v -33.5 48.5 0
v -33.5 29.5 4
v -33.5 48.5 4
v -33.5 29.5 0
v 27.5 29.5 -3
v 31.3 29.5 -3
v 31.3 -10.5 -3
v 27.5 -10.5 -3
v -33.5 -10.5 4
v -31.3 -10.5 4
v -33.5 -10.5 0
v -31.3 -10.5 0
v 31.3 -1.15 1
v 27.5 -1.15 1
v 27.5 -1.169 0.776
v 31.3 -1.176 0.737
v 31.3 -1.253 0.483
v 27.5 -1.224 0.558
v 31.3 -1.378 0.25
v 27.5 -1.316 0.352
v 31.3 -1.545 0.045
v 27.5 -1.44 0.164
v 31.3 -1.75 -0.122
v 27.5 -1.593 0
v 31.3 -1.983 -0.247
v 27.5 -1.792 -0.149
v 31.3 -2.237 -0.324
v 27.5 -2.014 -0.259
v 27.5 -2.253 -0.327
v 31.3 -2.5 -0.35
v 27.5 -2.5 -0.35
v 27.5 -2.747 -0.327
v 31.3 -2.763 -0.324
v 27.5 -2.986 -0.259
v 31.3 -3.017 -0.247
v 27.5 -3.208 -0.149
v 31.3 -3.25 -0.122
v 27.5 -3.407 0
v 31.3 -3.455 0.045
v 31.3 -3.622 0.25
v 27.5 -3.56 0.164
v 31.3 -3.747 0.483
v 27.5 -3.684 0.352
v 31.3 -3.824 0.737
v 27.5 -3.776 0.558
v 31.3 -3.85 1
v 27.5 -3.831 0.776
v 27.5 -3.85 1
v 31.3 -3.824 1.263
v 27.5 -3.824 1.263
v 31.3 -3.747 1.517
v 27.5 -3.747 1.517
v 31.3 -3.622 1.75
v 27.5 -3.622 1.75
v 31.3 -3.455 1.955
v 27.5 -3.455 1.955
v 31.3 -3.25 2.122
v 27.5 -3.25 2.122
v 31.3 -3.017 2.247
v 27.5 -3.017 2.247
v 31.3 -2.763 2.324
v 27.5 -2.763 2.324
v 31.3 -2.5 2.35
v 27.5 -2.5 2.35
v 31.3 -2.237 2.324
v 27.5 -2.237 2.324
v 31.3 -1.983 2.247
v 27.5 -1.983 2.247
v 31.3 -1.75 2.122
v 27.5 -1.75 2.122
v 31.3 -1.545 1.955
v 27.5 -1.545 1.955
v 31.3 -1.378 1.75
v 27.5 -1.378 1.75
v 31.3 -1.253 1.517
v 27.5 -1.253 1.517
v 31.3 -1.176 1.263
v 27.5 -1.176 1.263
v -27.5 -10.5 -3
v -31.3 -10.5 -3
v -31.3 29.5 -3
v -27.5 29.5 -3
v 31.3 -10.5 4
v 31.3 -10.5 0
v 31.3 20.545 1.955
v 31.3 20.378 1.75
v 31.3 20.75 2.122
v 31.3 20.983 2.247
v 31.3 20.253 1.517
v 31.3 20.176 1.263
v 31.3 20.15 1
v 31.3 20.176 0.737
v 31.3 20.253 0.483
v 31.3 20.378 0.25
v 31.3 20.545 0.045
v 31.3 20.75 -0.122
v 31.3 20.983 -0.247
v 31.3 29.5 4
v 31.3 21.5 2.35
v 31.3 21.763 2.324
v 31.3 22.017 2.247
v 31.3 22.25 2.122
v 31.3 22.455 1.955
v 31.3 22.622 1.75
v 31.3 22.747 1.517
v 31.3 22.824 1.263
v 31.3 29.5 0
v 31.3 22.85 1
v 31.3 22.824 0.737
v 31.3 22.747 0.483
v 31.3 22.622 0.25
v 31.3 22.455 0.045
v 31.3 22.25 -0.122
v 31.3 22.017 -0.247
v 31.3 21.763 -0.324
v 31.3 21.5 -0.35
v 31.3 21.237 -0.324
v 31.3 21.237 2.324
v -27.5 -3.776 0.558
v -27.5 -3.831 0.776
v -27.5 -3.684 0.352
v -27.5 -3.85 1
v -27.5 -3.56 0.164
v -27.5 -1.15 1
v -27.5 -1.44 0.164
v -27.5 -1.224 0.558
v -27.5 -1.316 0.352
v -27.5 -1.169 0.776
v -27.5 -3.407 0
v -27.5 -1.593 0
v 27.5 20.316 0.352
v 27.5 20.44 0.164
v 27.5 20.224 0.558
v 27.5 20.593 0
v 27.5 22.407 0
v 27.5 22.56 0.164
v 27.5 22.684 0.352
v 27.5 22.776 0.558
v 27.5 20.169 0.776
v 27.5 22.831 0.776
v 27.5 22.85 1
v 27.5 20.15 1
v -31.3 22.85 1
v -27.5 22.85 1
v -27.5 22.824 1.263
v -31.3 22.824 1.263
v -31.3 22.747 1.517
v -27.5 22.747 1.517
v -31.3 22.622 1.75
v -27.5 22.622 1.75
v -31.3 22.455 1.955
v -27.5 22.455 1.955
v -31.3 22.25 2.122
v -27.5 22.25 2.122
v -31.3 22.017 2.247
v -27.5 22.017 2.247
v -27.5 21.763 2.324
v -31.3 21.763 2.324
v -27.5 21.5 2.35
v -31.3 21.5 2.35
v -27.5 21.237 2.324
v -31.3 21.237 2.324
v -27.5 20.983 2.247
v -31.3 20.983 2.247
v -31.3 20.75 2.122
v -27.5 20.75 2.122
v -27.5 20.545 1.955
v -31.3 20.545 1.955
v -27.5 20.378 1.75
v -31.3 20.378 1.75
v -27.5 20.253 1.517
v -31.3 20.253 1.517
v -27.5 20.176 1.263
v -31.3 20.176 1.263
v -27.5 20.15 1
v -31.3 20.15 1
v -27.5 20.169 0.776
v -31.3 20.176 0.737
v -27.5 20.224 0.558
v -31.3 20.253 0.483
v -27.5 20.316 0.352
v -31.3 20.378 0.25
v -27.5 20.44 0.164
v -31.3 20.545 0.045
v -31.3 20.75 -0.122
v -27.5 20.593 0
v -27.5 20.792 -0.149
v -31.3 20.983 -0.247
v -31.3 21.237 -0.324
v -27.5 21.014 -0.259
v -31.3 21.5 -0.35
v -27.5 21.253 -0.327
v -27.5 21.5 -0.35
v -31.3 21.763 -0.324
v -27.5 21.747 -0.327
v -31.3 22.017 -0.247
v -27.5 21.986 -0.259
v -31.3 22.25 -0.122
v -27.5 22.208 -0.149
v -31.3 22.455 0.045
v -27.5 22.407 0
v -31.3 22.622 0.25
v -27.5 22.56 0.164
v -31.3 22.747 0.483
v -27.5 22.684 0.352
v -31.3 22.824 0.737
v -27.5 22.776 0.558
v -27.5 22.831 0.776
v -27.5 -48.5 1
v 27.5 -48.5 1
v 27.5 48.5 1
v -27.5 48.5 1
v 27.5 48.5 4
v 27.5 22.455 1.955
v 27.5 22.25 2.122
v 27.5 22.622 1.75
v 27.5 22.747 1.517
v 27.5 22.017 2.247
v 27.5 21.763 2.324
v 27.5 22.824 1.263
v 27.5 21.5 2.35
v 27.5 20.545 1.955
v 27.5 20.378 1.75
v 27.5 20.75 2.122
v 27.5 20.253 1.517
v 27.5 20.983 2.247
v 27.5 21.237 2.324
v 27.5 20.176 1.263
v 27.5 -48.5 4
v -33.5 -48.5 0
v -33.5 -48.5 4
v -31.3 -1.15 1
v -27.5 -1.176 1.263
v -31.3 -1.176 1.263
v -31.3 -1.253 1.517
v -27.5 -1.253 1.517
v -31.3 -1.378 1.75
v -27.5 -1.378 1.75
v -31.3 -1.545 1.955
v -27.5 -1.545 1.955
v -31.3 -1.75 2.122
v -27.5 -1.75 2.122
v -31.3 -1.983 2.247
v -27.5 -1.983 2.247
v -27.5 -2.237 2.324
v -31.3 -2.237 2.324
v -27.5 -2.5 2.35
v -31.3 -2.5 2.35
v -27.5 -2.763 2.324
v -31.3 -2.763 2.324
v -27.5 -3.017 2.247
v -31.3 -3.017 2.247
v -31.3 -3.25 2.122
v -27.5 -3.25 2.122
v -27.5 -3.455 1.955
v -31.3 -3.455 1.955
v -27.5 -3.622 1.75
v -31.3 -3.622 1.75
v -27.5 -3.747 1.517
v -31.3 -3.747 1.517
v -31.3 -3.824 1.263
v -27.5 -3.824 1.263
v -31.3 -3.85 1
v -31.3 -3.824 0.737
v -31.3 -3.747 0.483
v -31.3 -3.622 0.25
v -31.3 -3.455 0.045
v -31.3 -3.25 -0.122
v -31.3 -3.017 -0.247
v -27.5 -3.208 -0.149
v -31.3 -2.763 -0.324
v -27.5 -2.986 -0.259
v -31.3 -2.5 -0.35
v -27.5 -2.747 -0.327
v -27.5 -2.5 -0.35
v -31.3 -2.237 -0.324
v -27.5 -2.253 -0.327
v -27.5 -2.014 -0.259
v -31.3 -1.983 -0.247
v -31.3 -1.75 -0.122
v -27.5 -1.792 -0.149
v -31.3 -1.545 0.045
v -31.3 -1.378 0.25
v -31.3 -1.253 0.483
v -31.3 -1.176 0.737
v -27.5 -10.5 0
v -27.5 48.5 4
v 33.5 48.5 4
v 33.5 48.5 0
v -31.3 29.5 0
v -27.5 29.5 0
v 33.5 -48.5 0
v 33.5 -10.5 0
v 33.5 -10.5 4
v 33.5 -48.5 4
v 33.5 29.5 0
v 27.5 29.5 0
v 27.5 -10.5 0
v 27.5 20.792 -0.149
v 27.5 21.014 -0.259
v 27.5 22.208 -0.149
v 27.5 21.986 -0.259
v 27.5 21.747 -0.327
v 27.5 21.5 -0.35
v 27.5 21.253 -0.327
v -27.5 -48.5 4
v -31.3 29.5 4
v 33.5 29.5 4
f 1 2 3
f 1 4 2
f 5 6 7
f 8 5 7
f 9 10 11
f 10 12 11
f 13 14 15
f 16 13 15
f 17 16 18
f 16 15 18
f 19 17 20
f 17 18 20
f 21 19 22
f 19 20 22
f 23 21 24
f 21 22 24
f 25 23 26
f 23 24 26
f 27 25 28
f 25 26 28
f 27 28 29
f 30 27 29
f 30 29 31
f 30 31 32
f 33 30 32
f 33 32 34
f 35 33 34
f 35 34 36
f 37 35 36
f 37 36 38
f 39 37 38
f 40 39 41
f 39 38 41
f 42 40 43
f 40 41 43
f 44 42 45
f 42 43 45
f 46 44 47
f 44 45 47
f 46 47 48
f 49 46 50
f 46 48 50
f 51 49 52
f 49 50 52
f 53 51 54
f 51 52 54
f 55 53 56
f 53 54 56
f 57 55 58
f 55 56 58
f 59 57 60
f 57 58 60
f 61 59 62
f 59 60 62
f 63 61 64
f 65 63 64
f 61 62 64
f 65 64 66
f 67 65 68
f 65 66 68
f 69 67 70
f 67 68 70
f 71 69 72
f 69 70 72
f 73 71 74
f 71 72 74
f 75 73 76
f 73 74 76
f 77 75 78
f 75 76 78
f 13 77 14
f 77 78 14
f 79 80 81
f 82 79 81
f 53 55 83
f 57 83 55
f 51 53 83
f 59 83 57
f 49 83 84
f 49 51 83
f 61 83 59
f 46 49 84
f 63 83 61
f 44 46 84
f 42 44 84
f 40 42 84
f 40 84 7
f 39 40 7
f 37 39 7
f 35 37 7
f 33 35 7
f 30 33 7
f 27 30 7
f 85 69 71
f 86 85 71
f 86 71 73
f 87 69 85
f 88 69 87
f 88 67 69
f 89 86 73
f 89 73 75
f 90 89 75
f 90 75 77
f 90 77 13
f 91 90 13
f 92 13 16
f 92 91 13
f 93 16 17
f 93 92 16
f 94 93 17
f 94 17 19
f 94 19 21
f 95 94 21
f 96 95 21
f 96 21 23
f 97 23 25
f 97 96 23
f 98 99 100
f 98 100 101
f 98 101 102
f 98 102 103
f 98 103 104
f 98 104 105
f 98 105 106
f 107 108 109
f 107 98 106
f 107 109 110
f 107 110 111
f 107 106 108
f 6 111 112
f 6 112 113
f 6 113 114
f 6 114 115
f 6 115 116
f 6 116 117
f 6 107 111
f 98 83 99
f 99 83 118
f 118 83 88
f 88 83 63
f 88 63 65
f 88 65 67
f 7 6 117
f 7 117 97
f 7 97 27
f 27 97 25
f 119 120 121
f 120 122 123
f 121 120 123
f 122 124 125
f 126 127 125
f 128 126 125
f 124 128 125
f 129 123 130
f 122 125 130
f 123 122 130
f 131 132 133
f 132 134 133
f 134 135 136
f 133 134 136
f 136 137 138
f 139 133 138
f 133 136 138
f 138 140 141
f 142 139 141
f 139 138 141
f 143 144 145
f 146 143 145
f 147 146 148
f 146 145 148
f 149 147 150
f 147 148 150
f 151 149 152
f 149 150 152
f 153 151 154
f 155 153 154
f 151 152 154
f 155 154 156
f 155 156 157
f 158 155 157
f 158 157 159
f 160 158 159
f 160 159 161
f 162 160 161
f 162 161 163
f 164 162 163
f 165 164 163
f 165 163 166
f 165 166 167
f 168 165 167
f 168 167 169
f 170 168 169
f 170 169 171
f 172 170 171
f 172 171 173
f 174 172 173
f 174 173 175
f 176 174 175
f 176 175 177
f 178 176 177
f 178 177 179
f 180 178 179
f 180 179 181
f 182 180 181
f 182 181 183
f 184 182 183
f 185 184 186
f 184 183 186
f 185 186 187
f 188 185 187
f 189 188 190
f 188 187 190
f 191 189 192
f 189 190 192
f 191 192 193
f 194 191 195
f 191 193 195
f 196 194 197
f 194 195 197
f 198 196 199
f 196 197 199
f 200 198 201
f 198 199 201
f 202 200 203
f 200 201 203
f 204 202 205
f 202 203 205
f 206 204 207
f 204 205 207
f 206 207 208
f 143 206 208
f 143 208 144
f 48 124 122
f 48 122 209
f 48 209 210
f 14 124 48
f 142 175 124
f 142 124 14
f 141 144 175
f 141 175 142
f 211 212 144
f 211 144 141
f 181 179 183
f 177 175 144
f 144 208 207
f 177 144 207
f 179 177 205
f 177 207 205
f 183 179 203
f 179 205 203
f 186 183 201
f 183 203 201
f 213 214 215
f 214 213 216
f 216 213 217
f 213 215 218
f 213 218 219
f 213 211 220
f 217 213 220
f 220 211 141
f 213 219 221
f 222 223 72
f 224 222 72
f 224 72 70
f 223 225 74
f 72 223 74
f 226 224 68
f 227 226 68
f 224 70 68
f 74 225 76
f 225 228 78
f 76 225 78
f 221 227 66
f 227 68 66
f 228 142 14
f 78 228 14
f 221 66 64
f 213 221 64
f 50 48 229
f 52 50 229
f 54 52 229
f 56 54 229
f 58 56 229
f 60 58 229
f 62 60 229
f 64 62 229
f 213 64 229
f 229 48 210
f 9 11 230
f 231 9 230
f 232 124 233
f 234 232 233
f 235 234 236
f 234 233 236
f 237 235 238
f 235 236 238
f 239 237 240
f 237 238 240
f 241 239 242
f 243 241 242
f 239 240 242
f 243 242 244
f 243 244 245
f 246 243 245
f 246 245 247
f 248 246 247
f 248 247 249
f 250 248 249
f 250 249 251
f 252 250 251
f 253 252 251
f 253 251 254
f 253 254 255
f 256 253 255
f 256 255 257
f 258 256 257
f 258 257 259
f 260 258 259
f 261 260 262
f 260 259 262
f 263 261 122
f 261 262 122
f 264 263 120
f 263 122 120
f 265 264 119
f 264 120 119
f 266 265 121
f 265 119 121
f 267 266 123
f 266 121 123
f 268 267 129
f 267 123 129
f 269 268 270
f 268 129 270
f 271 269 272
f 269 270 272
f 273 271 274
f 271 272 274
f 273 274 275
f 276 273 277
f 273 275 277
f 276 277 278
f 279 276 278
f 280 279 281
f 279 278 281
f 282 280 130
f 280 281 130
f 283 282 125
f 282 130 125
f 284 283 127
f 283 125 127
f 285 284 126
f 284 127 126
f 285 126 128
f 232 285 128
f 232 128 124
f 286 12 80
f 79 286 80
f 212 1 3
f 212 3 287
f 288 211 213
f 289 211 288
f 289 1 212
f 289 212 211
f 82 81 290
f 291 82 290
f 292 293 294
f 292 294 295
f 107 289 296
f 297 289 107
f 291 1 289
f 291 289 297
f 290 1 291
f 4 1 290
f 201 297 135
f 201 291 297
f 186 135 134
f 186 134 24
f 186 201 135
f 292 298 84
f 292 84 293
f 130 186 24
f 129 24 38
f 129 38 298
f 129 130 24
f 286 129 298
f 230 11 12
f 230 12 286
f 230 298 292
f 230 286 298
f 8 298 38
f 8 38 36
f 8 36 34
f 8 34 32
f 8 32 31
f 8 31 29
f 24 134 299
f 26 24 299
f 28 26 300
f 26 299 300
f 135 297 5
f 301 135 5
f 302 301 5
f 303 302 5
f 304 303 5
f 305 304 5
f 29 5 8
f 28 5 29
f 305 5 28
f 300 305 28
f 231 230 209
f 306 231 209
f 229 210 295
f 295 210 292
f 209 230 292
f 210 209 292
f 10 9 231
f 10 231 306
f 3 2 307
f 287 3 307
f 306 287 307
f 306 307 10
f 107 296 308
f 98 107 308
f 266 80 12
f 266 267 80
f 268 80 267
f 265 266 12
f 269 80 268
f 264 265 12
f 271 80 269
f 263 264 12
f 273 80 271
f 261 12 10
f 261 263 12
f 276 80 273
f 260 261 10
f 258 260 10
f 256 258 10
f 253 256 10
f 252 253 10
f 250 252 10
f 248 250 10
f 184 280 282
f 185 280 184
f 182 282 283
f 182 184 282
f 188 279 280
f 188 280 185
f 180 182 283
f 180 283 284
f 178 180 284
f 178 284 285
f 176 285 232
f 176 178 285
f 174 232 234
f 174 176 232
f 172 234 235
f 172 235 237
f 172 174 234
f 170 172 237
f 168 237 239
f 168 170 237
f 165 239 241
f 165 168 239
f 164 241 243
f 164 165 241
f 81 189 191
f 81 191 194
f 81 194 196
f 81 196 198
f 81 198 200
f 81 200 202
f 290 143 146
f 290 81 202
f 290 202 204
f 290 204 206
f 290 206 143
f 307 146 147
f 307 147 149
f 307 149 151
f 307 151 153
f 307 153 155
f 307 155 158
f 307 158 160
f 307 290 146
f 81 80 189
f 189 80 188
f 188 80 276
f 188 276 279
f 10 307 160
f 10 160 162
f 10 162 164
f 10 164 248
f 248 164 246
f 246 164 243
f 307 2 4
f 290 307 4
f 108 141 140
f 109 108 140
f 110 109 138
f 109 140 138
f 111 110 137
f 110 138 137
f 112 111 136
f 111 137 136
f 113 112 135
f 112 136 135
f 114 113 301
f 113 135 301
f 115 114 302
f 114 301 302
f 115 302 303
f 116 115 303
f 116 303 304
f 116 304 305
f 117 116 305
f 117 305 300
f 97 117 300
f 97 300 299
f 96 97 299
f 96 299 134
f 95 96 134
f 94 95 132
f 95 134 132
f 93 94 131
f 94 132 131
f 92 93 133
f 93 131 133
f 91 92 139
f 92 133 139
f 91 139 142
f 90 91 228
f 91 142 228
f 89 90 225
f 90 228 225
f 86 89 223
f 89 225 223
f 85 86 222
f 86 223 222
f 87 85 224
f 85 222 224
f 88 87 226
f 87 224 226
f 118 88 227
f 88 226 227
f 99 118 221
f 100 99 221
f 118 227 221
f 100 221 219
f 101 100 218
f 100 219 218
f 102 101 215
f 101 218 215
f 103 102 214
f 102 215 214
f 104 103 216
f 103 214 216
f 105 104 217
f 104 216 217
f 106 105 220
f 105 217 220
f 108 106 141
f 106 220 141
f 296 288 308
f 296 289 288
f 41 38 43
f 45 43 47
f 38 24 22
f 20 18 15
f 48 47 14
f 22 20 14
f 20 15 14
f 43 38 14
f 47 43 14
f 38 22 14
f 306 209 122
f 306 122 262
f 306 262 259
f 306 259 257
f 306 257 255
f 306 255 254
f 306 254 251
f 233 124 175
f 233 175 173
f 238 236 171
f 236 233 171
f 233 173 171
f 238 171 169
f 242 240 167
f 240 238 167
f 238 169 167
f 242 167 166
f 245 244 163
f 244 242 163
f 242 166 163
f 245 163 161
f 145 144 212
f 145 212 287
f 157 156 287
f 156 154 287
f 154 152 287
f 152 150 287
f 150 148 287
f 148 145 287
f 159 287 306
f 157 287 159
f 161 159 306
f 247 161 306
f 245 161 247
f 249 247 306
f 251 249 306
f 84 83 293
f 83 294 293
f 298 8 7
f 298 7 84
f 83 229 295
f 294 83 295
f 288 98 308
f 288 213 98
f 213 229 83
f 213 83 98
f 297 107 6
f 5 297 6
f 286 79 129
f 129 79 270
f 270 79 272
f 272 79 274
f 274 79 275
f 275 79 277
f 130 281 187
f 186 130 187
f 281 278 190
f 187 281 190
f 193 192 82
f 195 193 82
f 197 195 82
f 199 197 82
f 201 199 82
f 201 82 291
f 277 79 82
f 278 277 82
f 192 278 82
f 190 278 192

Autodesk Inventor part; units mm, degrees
ref_plane "YZ Plane" through (0, 0, 0) normal (1, 0, 0) x (0, 1, 0)
ref_plane "XZ Plane" through (0, 0, 0) normal (0, 1, 0) x (-1, 0, 0)
ref_plane "XY Plane" through (0, 0, 0) normal (0, 0, 1) x (1, 0, 0)
sketch "スケッチ1" plane through (0, 0, 0) normal (0, 0, 1) x (1, 0, 0)
  line L0 (33.5, -48.5) -> (-33.5, -48.5)
  line L1 (-33.5, -48.5) -> (-33.5, 48.5)
  line L2 (-33.5, 48.5) -> (33.5, 48.5)
  line L3 (33.5, 48.5) -> (33.5, -48.5)
  line L4 (33.5, -48.5) -> (-33.5, 48.5) construction
  line L5 (-33.5, -48.5) -> (33.5, 48.5) construction
  point P0 (0, 0)
  dimension "d0" = 67
  dimension "d1" = 97
extrude "押し出し1" add sketch "スケッチ1" along normal blind 1
sketch "スケッチ3" plane through (33.5, -48.5, 0) normal (1, 0, 0) x (0, 0, -1)
  line L0 (0, 78) -> (-5, 78)
  line L1 (-5, 78) -> (-5, 38)
  line L2 (-5, 38) -> (0, 38)
  line L3 (0, 38) -> (0, 78)
  circle A0 centre (-1, 70) radius 1.35
  line L4 (0, 97) -> (-1, 97) projected
  line L5 (0, 0) -> (0, 97) projected
  circle A1 centre (-1, 46) radius 1.35
  point P0 (0, 48.5)
  dimension "d4" = 5
  dimension "d5" = 27
  dimension "d6" = 8
  dimension "d7" = 40
  dimension "d8" = 2.7
  dimension "d9" = 8
  dimension "d48" = 1
extrude "押し出し2" add sketch "スケッチ3" against normal blind 6 contours L3 A0 A1 L2 L1 L0
extrude "押し出し3" cut sketch "スケッチ3" against normal blind 2.2 contours L3 A0 A1 L2 L1 L0
mirror "ミラー1" about plane through (0, 0, 0) normal (1, 0, 0) of "押し出し2", "押し出し3"
sketch "スケッチ12" plane through (31.3, -48.5, 0) normal (1, 0, 0) x (0, 0, -1)
  line L0 (-1, 78) -> (-5, 78) projected
  line L1 (-5, 78) -> (3, 78)
  line L2 (3, 78) -> (3, 38)
  line L3 (3, 38) -> (-5, 38)
  line L4 (-5, 38) -> (-5, 78)
  arc A0 (-1, 71.35) -> (-1, 68.65) centre (-1, 70) ccw projected
  arc A1 (-1, 47.35) -> (-1, 44.65) centre (-1, 46) ccw projected
  circle A2 centre (-1, 70) radius 1.35
  circle A3 centre (-1, 46) radius 1.35
  point P0 (0, 48.5)
  point P1 (0, 38)
  point P2 (-1, 68.65)
  point P3 (-1, 44.65)
  dimension "d49" = 8
extrude "押し出し15" add sketch "スケッチ12" against normal up to surface (3.8 mm away)
sketch "スケッチ13" plane through (27.5, -10.5, -3) normal (-1, 0, 0) x (0, 0, 1)
  line L0 (4, 30.65) -> (4, 33.35) projected
  circle A0 centre (4, 32) radius 1.35
  line L1 (4, 6.65) -> (4, 9.35) projected
  circle A1 centre (4, 8) radius 1.35
  arc A2 (4, 30.65) -> (4, 33.35) centre (4, 32) ccw projected
  arc A3 (4, 6.65) -> (4, 9.35) centre (4, 8) ccw projected
  point P0 (3, 10.5)
extrude "押し出し16" cut sketch "スケッチ13" against normal through all
mirror "ミラー2" about plane through (0, 0, 0) normal (1, 0, 0) of "押し出し15", "押し出し16"
sketch "スケッチ14" plane through (0, 0, 1) normal (0, 0, 1) x (1, 0, 0)
  line L0 (-27.5, -10.5) -> (-27.5, 29.5) projected
  line L1 (27.5, -10.5) -> (27.5, 29.5) projected
  line L2 (33.5, 48.5) -> (-33.5, 48.5) projected
  line L3 (-33.5, -48.5) -> (33.5, -48.5) projected
  line L4 (-27.5, 48.5) -> (27.5, 48.5)
  line L5 (27.5, 48.5) -> (27.5, -48.5)
  line L6 (27.5, -48.5) -> (-27.5, -48.5)
  line L7 (-27.5, -48.5) -> (-27.5, 48.5)
  line L8 (-27.5, 22.85) -> (-27.5, 20.15) projected
  line L9 (-27.5, 20.15) -> (-27.5, -1.15) projected
  line L10 (-27.5, -1.15) -> (-27.5, -3.85) projected
  line L11 (-27.5, -3.85) -> (-27.5, -10.5) projected
  line L12 (-27.5, -10.5) -> (-31.3, -10.5) projected
  line L13 (-31.3, -10.5) -> (-33.5, -10.5) projected
  line L14 (-33.5, -10.5) -> (-33.5, -48.5) projected
  line L15 (-33.5, -48.5) -> (33.5, -48.5) projected
  line L16 (33.5, -48.5) -> (33.5, -10.5) projected
  line L17 (33.5, -10.5) -> (31.3, -10.5) projected
  line L18 (31.3, -10.5) -> (27.5, -10.5) projected
  line L19 (27.5, -10.5) -> (27.5, -3.85) projected
  line L20 (27.5, -3.85) -> (27.5, -1.15) projected
  line L21 (27.5, -1.15) -> (27.5, 20.15) projected
  line L22 (27.5, 20.15) -> (27.5, 22.85) projected
  line L23 (27.5, 22.85) -> (27.5, 29.5) projected
  line L24 (27.5, 29.5) -> (31.3, 29.5) projected
  line L25 (31.3, 29.5) -> (33.5, 29.5) projected
  line L26 (33.5, 29.5) -> (33.5, 48.5) projected
  line L27 (33.5, 48.5) -> (-33.5, 48.5) projected
  line L28 (-33.5, 48.5) -> (-33.5, 29.5) projected
  line L29 (-33.5, 29.5) -> (-31.3, 29.5) projected
  line L30 (-31.3, 29.5) -> (-27.5, 29.5) projected
  line L31 (-27.5, 29.5) -> (-27.5, 22.85) projected
  point P0 (0, 0)
  point P1 (-27.5, -48.5)
extrude "押し出し17" add sketch "スケッチ14" along normal up to surface (4 mm away) contours L7 L3 L14 L13 L12 | L5 L18 L17 L16 L3 | L30 L29 L28 L2 L7 | L2 L26 L25 L24 L5
sketch "スケッチ15" plane through (-33.5, -48.5, 5) normal (0, 0, 1) x (1, 0, 0)
  line L0 (2.2, 78) -> (2.2, 38) projected
  line L1 (0, 38) -> (2.2, 38) projected
  line L2 (0, 0) -> (0, 38) projected
  line L3 (6, 0) -> (0, 0) projected
  line L4 (6, 97) -> (6, 0) projected
  line L5 (0, 97) -> (6, 97) projected
  line L6 (0, 78) -> (0, 97) projected
  line L7 (2.2, 78) -> (0, 78) projected
  line L8 (64.8, 38) -> (64.8, 78) projected
  line L9 (67, 78) -> (64.8, 78) projected
  line L10 (67, 97) -> (67, 78) projected
  line L11 (61, 97) -> (67, 97) projected
  line L12 (61, 0) -> (61, 97) projected
  line L13 (67, 0) -> (61, 0) projected
  line L14 (67, 38) -> (67, 0) projected
  line L15 (64.8, 38) -> (67, 38) projected
  point P0 (33.5, 48.5)
extrude "押し出し18" cut sketch "スケッチ15" against normal blind 1
equation "\"d9\" = d6"
equation "\"BendRadius\" = Thickness"
equation "\"BendReliefWidth\" = Thickness"
equation "\"BendReliefDepth\" = 0.5 * Thickness"
equation "\"CornerReliefSize\" = 4 * Thickness"
equation "\"MinimumRemnant\" = 2 * Thickness"
equation "\"TransitionRadius\" = BendRadius"
equation "\"JacobiRadiusSize\" = BendRadius"
equation "\"GapSize\" = Thickness"
equation "\"Thickness\" = 3.048"
properties part number "cover_right"
